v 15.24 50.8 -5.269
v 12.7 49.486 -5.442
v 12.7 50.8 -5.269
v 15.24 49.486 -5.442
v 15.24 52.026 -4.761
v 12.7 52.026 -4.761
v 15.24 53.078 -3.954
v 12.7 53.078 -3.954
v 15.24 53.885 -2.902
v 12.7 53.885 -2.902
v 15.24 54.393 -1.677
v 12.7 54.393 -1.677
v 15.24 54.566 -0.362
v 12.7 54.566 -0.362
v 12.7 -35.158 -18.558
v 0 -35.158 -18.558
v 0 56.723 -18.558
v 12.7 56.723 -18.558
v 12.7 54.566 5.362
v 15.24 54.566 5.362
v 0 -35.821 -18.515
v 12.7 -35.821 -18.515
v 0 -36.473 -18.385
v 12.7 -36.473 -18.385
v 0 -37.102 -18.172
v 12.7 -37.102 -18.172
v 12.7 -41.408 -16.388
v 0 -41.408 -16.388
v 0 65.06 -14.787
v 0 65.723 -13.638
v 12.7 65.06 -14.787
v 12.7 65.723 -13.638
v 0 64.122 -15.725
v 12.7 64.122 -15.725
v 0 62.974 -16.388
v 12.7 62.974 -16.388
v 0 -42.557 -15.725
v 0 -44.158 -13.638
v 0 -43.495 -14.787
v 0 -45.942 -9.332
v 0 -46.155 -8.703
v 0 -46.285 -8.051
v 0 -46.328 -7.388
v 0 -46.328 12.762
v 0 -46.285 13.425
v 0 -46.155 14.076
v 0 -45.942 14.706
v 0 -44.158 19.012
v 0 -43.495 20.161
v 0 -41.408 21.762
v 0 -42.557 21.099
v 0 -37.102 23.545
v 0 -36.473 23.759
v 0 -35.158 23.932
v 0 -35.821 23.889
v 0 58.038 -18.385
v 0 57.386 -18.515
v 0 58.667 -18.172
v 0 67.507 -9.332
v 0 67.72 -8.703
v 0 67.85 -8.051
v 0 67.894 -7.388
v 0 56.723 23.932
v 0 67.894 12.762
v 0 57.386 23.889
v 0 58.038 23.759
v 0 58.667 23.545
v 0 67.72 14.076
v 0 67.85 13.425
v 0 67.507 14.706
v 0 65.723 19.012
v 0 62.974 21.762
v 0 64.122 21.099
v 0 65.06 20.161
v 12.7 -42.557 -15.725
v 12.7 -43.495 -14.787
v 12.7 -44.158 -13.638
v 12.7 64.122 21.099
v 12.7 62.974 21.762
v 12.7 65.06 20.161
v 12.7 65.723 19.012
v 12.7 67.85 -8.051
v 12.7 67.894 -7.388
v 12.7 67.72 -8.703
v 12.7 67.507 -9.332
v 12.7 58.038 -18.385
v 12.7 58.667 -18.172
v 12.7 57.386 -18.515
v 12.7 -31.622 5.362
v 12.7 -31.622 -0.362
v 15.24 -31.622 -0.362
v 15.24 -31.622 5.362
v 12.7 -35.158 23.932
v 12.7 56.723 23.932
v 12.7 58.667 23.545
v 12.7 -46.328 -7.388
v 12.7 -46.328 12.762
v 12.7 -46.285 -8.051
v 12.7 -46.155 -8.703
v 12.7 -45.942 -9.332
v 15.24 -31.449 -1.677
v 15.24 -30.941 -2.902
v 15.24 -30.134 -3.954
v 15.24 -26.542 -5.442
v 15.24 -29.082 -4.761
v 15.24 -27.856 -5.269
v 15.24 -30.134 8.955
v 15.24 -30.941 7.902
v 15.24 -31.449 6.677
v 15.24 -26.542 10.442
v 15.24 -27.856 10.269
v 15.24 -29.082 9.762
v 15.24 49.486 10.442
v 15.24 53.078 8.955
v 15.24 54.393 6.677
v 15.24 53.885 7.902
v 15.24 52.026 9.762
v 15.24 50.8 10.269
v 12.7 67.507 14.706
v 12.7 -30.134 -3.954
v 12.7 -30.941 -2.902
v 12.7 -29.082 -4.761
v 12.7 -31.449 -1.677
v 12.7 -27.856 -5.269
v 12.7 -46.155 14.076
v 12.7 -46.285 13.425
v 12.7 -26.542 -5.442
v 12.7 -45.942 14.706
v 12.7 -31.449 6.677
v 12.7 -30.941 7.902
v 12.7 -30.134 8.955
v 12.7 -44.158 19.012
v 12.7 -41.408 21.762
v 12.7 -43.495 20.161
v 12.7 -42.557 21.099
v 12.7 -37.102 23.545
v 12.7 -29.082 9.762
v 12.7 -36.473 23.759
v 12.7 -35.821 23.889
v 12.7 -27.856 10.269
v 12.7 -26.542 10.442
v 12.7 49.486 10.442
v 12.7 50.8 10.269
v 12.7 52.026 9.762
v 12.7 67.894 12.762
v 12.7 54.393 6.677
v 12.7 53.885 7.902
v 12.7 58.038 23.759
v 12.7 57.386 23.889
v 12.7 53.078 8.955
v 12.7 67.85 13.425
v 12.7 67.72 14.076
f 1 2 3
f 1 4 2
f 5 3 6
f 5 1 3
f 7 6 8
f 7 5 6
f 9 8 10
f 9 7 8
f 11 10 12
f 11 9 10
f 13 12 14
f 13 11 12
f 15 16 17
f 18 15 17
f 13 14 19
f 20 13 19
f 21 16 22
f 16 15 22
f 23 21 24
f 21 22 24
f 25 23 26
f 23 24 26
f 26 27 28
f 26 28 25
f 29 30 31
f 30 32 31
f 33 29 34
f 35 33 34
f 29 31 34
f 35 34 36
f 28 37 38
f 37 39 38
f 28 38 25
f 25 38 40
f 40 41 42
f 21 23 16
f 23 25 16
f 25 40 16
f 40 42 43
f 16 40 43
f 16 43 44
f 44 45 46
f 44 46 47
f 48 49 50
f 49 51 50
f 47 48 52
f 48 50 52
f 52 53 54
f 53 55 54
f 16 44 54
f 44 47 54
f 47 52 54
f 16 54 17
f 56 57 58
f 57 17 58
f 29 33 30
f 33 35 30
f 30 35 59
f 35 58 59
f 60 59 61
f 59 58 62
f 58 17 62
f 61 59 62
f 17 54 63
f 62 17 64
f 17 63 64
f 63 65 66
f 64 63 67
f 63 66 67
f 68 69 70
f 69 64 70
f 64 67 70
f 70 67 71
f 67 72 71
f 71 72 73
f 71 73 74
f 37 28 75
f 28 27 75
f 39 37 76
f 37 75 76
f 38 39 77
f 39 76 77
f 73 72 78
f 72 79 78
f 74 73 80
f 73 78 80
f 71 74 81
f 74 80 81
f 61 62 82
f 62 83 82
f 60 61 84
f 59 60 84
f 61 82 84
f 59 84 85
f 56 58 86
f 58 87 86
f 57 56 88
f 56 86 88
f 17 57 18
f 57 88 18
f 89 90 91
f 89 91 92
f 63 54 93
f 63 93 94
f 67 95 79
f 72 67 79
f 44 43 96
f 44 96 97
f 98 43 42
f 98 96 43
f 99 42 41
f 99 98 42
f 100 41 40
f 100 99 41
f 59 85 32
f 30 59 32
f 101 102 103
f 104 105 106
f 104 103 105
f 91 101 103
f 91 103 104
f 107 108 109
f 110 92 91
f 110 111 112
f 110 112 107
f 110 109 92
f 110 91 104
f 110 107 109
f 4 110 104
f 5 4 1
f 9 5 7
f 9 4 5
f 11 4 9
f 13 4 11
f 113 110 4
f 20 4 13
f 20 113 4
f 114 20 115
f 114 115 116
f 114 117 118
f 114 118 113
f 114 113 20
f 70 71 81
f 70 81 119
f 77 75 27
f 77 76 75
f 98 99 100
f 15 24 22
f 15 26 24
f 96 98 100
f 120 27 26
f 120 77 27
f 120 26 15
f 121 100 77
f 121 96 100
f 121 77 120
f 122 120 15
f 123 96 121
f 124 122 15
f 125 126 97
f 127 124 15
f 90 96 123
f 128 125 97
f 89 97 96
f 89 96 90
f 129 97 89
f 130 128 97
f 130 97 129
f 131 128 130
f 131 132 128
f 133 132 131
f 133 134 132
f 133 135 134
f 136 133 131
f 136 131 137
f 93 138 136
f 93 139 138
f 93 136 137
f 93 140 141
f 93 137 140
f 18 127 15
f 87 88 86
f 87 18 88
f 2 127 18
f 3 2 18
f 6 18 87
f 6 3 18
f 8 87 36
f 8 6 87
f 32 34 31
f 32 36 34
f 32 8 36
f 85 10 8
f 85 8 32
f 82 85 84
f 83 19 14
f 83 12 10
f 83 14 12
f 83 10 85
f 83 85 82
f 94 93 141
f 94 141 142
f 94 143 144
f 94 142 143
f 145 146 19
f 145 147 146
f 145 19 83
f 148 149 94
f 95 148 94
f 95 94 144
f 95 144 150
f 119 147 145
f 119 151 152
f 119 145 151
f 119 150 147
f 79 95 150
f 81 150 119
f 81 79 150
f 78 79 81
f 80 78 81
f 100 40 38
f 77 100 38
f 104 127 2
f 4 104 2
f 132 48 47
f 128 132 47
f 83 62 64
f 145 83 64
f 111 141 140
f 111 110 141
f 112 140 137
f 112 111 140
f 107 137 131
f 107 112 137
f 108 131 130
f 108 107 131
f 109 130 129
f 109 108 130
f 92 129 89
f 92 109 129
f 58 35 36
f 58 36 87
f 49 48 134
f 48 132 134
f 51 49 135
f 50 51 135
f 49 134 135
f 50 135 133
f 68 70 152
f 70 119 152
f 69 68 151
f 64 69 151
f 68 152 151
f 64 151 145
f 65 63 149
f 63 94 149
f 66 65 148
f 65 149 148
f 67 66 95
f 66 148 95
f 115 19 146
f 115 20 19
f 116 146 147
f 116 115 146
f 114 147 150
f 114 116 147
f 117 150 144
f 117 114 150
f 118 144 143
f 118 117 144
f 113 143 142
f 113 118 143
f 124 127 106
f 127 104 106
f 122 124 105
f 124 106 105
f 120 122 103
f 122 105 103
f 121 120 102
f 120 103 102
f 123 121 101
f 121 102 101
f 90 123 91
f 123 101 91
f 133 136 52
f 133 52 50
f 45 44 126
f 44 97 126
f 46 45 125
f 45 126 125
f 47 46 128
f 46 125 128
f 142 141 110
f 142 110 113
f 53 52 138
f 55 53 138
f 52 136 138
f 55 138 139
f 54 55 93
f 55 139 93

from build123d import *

# Parameters (mm, degrees)
F0_W        = 114.2217256129
F0_H        = 42.490478605
F1_DEPTH    = 12.7
F2_W        = 86.1872471869
F2_H        = 15.8843388781
F3_DEPTH    = 2.54
F4_R        = 5.08
F5_SIZE     = 5.08
F6_T1_DEPTH = 39.0415311919
F7_R        = 5.08


# Not quite as in the source:
# - a fillet or chamfer that OpenCascade refuses, or shapes differently, is made with other operations: its cross-section is extruded or revolved along the edge and cut away or added


with BuildPart() as f1:
    # F0 (on Right) → F1 (new body)
    with BuildSketch(Plane.YZ):
        with Locations((10.7826646417, 2.6869159192)):
            Rectangle(F0_W, F0_H)
    extrude(amount=F1_DEPTH)

    # F2 (on face) → F3 (join)
    with BuildSketch(Plane.YZ.offset(12.7)):
        with Locations((11.4720221609, 2.5003128685)):
            Rectangle(F2_W, F2_H)
    extrude(amount=F3_DEPTH)

    # F4
    f4_edges = [f1.edges().sort_by_distance(p)[0] for p in [
        (13.97, -31.621601, 10.442482),
        (13.97, -31.621601, -5.441857),
        (13.97, 54.565646, 10.442482),
        (13.97, 54.565646, -5.441857),
    ]]
    fillet(f4_edges, radius=F4_R)

    # F5
    f5_edges = [f1.edges().sort_by_distance(p)[0] for p in [
        (6.35, 67.893527, 23.932155),
        (6.35, 67.893527, -18.558323),
        (6.35, -46.328198, -18.558323),
        (6.35, -46.328198, 23.932155),
    ]]
    chamfer(f5_edges, length=F5_SIZE)

    # F6: chamfer of 5.08 on 8 edges, made by hand

    # F6_s2 → F6_t1 (cut)
    with BuildSketch(Plane.YZ.offset(-13.170765596)):
        Polygon((-42.7360957163, 22.4442576701), (-46.3281981647, 13.7721552217), (-46.3281981647, 18.8521552217), align=None)
        Polygon((-36.1681981647, 23.9321552217), (-44.8403006131, 20.3400527733), (-41.2481981647, 23.9321552217), align=None)
        Polygon((57.7335274482, 23.9321552217), (66.4056298966, 20.3400527733), (62.8135274482, 23.9321552217), align=None)
        Polygon((64.3014249997, 22.4442576701), (67.8935274482, 13.7721552217), (67.8935274482, 18.8521552217), align=None)
        Polygon((67.8935274482, -8.3983233833), (64.3014249997, -17.0704258318), (67.8935274482, -13.4783233833), align=None)
        Polygon((66.4056298966, -14.9662209349), (57.7335274482, -18.5583233833), (62.8135274482, -18.5583233833), align=None)
        Polygon((-46.3281981647, -8.3983233833), (-42.7360957163, -17.0704258318), (-46.3281981647, -13.4783233833), align=None)
        Polygon((-44.8403006131, -14.9662209349), (-36.1681981647, -18.5583233833), (-41.2481981647, -18.5583233833), align=None)
    extrude(amount=F6_T1_DEPTH, mode=Mode.SUBTRACT)

    # F7
    f7_edges = [f1.edges().sort_by_distance(p)[0] for p in [
        (6.35, -43.352403, -15.582528),
        (6.35, -36.168198, -18.558323),
        (6.35, -46.328198, -8.398323),
        (6.35, -43.352403, 20.95636),
        (6.35, -46.328198, 13.772155),
        (6.35, -36.168198, 23.932155),
        (6.35, 57.733527, 23.932155),
        (6.35, 64.917732, 20.95636),
        (6.35, 67.893527, 13.772155),
        (6.35, 67.893527, -8.398323),
        (6.35, 64.917732, -15.582528),
        (6.35, 57.733527, -18.558323),
    ]]
    fillet(f7_edges, radius=F7_R)


solid = f1.part
